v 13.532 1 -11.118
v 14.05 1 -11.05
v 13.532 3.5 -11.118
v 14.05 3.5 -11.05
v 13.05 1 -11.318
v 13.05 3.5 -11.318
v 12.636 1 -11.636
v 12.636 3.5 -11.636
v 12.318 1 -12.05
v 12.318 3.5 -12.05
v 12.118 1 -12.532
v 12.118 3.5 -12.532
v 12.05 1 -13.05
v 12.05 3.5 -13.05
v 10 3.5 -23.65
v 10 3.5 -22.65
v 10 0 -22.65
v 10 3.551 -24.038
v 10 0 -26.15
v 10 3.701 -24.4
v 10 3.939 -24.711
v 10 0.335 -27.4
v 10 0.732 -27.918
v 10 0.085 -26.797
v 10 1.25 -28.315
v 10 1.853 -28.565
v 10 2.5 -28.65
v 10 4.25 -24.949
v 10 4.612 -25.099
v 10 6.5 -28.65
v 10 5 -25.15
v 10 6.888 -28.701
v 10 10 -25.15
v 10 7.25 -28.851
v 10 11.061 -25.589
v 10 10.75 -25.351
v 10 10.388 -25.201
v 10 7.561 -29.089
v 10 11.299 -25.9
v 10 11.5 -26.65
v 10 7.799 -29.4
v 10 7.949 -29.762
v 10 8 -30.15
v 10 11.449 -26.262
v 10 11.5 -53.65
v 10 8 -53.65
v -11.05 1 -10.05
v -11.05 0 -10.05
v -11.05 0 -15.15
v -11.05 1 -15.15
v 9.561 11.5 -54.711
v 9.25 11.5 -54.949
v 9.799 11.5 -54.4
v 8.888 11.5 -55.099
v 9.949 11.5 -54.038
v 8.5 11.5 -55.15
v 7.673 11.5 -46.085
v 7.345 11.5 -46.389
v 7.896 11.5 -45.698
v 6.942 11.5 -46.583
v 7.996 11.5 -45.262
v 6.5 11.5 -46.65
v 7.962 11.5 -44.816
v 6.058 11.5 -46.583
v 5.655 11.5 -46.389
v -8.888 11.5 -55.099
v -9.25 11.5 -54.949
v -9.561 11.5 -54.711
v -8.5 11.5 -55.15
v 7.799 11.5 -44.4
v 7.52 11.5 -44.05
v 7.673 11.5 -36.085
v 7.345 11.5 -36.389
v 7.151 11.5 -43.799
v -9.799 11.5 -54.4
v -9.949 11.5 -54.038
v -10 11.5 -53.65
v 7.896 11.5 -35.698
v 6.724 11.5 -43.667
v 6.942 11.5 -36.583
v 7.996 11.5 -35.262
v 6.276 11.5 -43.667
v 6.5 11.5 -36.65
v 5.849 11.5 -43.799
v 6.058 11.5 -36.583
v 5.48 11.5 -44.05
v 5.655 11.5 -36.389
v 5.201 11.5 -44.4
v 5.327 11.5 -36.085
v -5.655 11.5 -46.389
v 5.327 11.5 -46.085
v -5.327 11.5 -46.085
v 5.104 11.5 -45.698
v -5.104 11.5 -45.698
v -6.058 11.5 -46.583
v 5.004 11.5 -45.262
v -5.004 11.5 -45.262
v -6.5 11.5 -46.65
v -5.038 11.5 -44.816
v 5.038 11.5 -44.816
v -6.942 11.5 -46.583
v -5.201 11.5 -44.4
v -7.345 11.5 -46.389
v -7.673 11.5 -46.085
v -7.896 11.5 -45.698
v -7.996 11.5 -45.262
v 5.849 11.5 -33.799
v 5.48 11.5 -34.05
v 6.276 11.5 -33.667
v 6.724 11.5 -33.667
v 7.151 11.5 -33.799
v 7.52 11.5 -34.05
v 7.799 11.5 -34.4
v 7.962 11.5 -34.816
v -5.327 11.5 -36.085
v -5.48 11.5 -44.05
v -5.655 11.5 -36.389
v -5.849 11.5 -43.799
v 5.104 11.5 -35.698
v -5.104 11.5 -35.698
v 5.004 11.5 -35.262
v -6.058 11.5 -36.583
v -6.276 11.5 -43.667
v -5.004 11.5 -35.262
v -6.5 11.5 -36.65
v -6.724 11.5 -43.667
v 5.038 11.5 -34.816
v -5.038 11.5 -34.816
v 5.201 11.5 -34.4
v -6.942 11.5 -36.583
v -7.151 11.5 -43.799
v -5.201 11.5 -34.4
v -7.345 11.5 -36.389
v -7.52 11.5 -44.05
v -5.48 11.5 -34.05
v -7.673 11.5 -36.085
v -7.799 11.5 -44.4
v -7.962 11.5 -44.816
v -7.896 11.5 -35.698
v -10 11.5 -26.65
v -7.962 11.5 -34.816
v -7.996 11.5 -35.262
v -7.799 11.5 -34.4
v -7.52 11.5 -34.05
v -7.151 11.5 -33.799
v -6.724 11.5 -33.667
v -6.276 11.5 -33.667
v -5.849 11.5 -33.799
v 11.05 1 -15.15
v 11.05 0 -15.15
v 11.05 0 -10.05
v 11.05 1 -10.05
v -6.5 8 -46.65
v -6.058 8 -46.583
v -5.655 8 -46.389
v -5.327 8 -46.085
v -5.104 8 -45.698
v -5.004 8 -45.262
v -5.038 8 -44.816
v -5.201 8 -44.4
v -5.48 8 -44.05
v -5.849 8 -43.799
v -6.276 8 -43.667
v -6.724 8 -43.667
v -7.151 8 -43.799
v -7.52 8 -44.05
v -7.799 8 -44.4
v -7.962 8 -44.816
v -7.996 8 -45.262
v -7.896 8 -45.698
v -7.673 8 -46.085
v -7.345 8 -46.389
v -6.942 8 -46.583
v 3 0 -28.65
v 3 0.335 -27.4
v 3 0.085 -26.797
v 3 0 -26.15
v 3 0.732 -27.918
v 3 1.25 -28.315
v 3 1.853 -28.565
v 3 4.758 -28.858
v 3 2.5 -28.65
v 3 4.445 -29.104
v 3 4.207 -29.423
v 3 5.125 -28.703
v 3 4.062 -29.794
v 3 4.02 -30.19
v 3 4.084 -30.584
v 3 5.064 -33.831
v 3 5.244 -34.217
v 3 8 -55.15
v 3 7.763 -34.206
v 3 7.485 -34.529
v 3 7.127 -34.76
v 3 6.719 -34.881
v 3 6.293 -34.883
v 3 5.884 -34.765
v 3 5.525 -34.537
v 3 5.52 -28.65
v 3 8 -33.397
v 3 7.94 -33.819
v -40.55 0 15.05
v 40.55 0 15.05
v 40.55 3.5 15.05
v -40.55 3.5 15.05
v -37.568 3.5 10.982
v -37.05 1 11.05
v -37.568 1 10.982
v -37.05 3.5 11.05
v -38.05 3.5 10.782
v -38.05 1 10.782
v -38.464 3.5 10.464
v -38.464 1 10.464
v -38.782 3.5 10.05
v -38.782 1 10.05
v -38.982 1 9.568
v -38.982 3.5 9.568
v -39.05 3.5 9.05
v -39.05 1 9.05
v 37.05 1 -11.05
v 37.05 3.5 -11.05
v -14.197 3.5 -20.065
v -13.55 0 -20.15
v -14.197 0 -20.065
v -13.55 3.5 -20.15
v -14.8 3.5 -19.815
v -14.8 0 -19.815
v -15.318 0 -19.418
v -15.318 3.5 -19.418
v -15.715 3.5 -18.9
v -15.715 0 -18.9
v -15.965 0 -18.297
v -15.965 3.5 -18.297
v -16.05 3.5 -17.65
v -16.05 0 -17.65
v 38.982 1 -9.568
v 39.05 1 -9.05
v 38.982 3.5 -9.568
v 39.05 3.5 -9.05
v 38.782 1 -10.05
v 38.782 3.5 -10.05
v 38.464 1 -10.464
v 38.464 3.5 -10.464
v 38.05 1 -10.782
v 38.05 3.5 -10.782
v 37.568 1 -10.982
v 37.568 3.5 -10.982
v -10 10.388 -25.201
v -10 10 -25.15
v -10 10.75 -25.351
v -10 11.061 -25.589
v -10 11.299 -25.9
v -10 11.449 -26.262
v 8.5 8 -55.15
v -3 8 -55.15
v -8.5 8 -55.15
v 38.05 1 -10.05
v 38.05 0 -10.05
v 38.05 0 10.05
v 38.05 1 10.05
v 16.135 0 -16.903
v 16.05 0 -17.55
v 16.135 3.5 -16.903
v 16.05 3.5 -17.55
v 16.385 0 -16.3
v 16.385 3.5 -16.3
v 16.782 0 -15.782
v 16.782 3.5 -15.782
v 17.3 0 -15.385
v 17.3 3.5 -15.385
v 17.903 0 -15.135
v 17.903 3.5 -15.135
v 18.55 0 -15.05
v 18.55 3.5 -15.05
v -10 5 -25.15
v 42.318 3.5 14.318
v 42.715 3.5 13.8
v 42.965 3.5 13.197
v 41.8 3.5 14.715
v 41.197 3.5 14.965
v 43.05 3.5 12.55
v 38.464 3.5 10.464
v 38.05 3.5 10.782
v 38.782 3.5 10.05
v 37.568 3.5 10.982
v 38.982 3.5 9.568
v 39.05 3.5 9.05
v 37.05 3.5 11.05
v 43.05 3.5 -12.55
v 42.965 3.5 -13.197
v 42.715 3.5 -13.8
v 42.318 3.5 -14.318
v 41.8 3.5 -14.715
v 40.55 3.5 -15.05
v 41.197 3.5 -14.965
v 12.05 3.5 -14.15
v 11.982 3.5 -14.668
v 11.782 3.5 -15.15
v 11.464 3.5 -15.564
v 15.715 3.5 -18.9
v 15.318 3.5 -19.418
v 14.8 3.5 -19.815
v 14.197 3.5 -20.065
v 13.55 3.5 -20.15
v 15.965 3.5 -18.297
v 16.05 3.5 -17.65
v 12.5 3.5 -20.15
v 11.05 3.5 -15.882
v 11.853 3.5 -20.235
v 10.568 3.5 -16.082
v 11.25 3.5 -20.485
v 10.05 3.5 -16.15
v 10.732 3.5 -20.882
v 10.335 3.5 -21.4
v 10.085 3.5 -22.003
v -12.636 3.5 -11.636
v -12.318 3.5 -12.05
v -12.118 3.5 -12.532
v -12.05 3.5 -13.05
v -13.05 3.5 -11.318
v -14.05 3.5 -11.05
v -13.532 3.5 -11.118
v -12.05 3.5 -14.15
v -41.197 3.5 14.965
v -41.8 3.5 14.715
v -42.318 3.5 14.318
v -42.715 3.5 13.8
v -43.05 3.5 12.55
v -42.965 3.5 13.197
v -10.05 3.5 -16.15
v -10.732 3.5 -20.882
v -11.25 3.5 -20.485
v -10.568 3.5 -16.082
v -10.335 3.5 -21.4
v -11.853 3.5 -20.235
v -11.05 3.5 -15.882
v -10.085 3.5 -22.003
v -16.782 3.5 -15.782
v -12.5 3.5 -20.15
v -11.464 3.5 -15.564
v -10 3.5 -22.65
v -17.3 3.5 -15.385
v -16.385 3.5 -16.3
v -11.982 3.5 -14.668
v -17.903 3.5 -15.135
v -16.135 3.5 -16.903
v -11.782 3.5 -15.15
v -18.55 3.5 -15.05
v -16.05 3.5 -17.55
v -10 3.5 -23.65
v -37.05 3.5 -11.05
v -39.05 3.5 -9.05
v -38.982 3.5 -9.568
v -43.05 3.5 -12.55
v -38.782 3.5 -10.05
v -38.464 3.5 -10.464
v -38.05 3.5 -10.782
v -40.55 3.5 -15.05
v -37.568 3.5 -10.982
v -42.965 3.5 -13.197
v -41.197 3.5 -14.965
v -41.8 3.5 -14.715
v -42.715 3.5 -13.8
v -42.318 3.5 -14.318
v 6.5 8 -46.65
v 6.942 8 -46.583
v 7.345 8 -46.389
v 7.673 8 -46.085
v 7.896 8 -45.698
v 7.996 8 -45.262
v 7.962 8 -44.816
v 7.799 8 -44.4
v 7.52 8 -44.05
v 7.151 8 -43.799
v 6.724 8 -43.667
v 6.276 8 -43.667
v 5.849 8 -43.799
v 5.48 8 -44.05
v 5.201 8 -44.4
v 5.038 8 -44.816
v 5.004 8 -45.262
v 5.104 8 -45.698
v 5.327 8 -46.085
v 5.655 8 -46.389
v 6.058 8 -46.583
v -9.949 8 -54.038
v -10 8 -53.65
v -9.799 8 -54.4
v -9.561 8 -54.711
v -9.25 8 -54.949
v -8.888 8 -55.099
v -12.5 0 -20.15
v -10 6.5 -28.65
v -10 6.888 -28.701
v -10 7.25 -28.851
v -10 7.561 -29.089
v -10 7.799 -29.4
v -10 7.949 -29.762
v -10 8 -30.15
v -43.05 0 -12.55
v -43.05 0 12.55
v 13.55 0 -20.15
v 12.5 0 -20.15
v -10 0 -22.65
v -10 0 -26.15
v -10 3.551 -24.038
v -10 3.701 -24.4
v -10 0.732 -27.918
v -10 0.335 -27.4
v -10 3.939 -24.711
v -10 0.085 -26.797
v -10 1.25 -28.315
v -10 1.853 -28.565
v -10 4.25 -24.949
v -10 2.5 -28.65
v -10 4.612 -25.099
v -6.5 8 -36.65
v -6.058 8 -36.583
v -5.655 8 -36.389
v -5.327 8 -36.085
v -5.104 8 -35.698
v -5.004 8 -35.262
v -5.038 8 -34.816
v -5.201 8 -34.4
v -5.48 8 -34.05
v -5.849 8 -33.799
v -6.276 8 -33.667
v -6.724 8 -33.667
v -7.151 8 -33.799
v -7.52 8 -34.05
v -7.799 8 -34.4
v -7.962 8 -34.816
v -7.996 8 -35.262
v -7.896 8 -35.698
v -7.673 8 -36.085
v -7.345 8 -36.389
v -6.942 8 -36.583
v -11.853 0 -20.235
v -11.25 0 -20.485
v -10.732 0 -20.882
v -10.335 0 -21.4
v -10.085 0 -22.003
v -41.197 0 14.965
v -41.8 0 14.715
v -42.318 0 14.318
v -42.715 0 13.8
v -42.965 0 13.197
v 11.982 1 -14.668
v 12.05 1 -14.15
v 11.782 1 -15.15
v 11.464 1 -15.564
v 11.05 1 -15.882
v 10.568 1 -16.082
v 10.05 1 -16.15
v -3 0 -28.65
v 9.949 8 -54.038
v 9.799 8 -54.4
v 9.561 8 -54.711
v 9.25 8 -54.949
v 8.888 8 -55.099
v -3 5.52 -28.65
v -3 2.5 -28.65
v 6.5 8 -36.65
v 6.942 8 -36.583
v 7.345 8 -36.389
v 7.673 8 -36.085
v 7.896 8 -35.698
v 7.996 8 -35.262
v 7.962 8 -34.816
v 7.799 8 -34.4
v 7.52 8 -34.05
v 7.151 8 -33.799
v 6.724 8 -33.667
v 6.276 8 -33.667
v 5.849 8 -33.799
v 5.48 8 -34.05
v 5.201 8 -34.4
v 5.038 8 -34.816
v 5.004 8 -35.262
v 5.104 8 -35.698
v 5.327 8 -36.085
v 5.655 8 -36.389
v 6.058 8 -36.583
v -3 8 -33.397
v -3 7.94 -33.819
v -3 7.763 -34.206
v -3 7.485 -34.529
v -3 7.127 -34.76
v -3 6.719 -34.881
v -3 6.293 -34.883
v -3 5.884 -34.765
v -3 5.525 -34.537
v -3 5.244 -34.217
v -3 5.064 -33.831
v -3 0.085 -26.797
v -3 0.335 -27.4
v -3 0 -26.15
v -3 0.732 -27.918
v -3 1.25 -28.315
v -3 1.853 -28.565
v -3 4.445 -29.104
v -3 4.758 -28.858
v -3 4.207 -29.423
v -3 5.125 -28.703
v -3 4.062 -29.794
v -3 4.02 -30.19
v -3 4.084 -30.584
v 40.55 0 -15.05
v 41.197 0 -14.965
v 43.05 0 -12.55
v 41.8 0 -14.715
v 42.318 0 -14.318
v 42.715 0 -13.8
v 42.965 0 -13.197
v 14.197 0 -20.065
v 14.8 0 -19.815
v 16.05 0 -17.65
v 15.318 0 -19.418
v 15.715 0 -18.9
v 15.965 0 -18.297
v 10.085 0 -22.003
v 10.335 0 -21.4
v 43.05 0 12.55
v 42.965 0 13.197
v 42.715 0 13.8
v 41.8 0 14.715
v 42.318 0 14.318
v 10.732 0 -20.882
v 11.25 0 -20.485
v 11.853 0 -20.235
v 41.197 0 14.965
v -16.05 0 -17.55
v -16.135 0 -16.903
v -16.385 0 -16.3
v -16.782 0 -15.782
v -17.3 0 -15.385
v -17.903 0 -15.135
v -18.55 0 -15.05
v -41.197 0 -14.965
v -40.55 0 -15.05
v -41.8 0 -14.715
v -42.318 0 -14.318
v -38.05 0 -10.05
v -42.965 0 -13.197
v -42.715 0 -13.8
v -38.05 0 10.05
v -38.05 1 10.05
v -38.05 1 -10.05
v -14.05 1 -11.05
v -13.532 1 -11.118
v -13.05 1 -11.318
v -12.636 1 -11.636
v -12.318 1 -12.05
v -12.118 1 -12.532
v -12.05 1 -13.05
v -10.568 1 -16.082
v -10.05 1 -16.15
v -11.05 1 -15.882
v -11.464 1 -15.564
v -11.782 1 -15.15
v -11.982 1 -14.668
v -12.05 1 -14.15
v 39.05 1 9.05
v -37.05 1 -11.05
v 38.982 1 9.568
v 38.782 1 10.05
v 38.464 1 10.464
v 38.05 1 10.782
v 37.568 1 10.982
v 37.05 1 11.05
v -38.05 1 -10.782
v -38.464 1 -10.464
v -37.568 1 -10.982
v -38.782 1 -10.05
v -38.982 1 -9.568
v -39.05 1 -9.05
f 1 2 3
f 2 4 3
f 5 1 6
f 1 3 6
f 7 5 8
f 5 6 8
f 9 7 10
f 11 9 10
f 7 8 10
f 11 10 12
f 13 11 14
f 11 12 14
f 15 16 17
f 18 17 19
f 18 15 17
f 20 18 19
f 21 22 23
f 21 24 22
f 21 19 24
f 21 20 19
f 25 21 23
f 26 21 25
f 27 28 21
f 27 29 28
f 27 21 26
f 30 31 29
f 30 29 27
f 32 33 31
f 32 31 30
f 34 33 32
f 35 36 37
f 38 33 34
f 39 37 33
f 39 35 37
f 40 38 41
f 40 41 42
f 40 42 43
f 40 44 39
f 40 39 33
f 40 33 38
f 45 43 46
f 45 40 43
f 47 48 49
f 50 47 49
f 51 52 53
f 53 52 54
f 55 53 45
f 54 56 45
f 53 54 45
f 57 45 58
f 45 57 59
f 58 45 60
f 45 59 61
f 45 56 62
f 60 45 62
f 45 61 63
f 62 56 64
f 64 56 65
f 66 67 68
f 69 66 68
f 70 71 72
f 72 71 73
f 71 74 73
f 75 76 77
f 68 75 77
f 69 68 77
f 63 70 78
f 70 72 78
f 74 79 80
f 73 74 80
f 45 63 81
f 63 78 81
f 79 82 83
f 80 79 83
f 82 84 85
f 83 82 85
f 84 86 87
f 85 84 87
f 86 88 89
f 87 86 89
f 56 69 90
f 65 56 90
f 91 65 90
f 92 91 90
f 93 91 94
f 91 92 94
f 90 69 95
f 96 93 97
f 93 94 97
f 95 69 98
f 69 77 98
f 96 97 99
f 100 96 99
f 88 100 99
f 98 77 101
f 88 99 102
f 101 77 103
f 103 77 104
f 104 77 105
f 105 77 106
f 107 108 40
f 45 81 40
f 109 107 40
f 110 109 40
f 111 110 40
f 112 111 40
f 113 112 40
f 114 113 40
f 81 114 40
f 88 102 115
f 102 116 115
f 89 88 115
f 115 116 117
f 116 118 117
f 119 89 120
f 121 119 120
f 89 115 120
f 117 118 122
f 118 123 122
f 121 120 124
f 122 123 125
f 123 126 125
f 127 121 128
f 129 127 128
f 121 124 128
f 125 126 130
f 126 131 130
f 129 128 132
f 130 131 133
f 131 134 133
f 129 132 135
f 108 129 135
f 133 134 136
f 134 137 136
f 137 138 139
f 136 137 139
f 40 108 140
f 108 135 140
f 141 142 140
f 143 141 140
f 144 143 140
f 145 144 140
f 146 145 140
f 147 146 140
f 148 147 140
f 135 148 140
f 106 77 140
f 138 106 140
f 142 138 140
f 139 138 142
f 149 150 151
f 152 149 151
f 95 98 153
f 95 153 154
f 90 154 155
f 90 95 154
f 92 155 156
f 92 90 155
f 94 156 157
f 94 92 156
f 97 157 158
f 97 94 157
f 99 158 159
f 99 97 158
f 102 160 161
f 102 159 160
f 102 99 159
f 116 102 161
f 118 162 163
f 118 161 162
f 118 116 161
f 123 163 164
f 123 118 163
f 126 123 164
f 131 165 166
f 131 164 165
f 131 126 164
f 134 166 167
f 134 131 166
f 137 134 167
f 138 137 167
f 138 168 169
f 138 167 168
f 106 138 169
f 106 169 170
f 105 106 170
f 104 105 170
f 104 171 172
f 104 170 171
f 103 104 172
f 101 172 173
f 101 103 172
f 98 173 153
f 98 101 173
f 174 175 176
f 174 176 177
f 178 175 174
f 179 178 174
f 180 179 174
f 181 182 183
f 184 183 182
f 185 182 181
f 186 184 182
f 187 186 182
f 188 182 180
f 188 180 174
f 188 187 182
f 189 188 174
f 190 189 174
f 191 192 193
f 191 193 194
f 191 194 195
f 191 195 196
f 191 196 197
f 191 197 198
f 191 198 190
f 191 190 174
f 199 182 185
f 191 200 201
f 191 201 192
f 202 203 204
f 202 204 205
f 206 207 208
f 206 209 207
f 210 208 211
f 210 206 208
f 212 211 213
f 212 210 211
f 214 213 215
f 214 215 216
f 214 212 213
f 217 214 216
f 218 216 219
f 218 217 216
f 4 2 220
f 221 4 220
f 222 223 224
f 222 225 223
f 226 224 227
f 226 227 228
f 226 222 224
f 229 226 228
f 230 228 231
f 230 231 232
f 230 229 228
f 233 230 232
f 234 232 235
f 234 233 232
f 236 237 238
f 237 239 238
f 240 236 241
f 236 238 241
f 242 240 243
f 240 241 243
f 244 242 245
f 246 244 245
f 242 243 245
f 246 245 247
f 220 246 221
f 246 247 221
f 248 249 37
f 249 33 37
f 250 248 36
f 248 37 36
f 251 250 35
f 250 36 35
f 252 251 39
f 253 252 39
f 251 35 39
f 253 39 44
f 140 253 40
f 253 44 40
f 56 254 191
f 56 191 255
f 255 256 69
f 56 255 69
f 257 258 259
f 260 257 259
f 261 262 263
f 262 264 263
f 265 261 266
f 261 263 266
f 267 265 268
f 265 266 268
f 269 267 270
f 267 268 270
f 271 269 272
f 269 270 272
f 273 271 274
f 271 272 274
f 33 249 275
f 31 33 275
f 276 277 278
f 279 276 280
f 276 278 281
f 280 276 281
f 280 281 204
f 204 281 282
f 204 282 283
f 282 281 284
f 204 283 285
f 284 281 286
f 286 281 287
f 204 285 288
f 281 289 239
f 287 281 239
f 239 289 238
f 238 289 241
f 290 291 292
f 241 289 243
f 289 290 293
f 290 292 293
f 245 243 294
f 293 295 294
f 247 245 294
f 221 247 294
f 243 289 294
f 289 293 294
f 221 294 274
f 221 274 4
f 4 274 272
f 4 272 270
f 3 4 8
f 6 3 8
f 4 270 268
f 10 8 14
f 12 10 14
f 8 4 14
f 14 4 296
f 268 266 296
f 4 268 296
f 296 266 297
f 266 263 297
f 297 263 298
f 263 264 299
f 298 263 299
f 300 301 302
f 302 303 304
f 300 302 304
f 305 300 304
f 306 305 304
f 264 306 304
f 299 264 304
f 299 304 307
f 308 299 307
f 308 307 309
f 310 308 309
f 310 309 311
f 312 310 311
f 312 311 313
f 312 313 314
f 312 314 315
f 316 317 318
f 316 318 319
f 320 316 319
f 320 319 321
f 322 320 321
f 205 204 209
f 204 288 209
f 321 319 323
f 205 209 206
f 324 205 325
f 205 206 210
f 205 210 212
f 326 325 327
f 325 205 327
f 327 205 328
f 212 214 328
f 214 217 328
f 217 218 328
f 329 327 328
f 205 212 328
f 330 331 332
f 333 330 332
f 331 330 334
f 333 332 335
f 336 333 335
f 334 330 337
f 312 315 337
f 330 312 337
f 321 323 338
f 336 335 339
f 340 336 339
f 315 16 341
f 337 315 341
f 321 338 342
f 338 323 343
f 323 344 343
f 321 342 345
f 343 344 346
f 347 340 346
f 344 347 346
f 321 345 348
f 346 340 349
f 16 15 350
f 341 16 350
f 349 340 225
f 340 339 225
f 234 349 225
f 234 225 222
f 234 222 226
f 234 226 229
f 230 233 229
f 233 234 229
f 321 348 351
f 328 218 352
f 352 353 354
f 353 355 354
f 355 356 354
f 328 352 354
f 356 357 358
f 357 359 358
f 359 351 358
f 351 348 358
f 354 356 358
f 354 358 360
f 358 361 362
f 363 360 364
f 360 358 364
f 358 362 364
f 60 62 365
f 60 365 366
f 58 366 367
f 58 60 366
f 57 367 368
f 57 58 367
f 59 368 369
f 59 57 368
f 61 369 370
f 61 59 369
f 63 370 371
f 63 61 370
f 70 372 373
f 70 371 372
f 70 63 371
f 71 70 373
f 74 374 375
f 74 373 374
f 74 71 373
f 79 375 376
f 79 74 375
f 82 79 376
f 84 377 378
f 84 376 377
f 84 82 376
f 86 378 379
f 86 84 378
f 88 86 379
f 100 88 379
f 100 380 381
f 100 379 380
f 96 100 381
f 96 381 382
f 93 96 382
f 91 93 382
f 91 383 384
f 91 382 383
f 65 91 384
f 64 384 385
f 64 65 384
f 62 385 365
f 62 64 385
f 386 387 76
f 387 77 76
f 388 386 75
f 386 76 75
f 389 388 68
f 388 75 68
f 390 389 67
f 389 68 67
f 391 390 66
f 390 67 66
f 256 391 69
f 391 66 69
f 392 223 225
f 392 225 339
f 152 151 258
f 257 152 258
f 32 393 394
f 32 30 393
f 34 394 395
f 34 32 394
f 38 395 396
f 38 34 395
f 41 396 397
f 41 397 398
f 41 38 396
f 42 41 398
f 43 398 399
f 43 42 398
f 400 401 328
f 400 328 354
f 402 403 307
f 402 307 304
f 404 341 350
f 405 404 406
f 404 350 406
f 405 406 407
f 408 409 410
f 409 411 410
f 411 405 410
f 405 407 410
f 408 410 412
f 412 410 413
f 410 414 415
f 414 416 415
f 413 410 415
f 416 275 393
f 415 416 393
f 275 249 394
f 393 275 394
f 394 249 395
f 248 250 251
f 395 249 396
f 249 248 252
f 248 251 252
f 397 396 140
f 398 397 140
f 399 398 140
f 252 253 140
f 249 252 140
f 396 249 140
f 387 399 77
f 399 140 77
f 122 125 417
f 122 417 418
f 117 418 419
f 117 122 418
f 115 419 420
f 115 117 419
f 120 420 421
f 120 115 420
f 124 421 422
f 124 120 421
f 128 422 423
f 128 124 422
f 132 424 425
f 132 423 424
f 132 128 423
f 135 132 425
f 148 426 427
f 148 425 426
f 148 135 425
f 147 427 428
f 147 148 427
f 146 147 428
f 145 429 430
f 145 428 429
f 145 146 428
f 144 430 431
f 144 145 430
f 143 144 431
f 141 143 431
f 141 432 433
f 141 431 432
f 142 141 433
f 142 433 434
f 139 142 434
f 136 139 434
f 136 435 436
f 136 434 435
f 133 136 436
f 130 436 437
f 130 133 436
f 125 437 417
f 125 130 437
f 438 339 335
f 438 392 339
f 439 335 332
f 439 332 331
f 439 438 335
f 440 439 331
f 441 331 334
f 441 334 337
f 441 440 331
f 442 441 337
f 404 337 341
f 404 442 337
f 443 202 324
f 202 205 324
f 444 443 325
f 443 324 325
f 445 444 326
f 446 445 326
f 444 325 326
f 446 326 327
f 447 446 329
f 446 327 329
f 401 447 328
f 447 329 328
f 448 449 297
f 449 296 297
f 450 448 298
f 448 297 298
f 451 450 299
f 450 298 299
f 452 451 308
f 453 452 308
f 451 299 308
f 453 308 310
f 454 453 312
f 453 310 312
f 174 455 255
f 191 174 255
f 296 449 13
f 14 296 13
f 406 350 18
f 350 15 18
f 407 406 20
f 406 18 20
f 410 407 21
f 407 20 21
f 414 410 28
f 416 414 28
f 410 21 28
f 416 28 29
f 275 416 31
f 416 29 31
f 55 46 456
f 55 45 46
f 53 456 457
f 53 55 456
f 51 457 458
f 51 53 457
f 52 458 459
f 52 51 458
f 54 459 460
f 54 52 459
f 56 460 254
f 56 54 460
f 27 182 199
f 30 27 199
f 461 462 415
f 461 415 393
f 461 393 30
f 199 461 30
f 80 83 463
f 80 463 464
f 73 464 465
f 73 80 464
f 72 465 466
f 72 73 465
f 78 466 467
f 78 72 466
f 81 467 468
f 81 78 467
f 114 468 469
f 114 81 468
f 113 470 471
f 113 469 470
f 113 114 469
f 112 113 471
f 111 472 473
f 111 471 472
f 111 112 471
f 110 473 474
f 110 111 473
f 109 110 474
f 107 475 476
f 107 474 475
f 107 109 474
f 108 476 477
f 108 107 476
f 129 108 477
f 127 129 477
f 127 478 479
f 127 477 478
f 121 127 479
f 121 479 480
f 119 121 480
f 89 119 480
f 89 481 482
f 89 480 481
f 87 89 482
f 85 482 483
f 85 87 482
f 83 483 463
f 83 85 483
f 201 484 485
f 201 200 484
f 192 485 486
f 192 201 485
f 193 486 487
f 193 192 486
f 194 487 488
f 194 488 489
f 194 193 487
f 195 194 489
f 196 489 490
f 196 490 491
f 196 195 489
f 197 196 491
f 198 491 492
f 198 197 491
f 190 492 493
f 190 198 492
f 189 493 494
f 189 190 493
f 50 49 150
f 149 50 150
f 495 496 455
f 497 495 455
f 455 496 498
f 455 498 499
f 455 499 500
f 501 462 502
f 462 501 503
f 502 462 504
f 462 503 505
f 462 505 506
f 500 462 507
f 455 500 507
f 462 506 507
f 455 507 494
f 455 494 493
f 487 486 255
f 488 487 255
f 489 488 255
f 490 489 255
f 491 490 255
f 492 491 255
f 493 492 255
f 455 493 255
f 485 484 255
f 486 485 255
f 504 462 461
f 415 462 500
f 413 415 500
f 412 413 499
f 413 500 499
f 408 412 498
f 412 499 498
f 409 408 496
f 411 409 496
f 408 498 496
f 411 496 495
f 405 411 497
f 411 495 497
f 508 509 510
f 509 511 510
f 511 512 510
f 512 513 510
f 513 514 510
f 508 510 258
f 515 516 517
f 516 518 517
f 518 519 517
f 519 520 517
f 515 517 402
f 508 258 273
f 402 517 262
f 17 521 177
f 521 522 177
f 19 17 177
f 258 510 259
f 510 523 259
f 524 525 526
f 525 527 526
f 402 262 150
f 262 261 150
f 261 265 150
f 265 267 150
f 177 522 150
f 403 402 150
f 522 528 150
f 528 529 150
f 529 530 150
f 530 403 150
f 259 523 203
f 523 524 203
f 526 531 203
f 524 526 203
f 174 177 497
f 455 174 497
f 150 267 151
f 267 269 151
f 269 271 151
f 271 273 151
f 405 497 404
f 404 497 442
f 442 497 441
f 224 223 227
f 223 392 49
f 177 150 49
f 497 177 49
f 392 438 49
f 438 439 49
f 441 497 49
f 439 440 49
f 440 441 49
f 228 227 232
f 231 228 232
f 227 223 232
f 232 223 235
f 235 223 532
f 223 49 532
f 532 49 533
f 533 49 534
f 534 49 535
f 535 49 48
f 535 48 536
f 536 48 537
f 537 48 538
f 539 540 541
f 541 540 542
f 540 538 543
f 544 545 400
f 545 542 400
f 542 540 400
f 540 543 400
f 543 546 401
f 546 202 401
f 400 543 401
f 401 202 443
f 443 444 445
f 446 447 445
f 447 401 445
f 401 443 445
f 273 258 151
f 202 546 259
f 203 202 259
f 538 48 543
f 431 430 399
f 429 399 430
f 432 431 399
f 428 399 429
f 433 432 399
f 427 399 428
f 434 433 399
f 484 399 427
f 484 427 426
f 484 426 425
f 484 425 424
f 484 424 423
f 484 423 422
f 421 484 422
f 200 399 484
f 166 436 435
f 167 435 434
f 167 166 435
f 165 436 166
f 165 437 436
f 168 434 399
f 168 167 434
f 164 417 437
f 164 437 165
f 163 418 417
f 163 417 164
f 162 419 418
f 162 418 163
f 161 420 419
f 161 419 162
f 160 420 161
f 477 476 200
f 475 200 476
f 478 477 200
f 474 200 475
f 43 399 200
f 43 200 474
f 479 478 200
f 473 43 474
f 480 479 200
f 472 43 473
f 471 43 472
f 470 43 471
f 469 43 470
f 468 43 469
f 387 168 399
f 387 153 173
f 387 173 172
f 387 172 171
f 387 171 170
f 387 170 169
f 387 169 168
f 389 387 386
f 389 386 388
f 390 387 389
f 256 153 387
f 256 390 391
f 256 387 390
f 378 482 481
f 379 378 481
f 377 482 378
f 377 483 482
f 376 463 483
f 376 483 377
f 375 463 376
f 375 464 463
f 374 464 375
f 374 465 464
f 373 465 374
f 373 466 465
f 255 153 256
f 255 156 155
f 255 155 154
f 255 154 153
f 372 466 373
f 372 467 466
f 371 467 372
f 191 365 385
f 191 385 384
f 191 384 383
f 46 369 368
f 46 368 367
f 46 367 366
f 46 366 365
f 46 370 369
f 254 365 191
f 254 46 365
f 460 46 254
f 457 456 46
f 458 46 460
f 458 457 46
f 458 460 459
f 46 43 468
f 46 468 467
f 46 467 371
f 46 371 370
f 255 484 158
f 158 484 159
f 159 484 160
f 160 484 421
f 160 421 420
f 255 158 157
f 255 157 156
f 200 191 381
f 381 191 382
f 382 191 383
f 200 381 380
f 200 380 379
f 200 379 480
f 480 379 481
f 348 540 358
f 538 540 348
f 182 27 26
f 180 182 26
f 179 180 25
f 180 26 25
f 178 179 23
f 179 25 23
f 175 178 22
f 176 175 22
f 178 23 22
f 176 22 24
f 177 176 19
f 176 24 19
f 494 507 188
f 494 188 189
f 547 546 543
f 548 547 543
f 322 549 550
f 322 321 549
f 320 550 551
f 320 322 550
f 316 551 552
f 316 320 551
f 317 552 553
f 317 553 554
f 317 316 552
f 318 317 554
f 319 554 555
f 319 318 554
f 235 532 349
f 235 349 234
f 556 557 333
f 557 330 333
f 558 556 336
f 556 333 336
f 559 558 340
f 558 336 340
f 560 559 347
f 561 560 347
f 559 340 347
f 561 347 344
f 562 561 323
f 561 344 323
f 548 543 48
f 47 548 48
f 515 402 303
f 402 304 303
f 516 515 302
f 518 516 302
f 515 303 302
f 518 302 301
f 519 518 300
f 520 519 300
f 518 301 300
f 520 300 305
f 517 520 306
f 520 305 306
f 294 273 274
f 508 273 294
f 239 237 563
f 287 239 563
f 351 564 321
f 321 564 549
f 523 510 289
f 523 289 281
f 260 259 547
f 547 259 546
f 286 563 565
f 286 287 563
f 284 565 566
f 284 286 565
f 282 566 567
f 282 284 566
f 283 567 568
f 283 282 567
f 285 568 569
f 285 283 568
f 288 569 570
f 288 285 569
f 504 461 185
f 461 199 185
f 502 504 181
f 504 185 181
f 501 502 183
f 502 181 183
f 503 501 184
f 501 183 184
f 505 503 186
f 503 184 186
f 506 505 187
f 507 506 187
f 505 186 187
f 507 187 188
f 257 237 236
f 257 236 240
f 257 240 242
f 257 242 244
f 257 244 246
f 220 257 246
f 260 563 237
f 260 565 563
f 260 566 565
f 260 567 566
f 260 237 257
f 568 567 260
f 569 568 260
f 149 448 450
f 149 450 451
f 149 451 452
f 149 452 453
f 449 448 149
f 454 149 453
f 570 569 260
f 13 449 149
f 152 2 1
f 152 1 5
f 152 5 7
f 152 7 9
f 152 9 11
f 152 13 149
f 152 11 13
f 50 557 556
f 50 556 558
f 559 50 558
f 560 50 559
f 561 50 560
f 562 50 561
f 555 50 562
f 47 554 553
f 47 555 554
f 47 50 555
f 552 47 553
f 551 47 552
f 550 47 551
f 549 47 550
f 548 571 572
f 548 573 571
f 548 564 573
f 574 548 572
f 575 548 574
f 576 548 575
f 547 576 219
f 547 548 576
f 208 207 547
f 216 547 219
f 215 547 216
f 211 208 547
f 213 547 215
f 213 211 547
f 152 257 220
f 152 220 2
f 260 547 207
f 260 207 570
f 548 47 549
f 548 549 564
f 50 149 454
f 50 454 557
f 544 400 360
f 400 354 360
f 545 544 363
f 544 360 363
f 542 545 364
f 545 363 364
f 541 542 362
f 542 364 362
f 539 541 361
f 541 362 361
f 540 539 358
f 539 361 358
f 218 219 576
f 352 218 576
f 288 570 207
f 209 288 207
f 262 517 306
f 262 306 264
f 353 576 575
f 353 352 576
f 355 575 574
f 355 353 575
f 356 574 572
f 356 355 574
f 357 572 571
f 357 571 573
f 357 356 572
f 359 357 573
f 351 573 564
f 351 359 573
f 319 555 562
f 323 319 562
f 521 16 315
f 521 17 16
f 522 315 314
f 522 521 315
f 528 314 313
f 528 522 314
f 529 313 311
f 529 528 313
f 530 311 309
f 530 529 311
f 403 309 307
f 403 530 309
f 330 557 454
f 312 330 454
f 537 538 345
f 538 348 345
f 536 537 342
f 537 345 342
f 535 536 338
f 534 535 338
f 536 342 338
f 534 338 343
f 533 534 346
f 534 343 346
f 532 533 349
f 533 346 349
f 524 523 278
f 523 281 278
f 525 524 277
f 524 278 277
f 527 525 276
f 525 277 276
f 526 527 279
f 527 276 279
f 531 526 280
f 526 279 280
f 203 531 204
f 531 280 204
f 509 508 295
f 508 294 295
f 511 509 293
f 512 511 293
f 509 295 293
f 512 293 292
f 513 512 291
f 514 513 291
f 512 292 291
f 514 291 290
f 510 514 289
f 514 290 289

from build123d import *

# Parameters (mm, degrees)
RESSALTO_EXTRUS_O1_DEPTH      = 3.5
RESSALTO_EXTRUS_O2_DEPTH      = 1
RESSALTO_EXTRUS_O3_DEPTH      = 10
RESSALTO_EXTRUS_O3_DEPTH_BACK = 10
ESBO_O4_W                     = 26.5
ESBO_O4_H                     = 8
CORTE_EXTRUS_O1_DEPTH         = 7
CORTE_EXTRUS_O2_START         = -20
ESBO_O4_2_W                   = 26.5
ESBO_O4_2_H                   = 8
CORTE_EXTRUS_O2_DEPTH         = 7
CORTE_EXTRUS_O3_DEPTH         = 71.418925013
CORTE_EXTRUS_O3_DEPTH_BACK    = 71.418925013
ESBO_O5_R                     = 1.5
FILETE1_R                     = 2
FILETE2_R                     = 2.5
FILETE3_R                     = 1.5
CORTE_EXTRUS_O4_DEPTH         = 7
CORTE_EXTRUS_O5_START         = -13
CORTE_EXTRUS_O5_DEPTH         = 7


with BuildPart() as part:
    # Esboço1 → Ressalto-extrusão1 (new body)
    with BuildSketch(Plane(origin=(0, 0, 0), x_dir=(1, 0, 0), z_dir=(0, 1, 0))):
        Polygon((-16.05, 20.15), (16.05, 20.15), (16.05, 15.05), (43.05, 15.05), (43.05, -15.05), (-43.05, -15.05), (-43.05, 15.05), (-16.05, 15.05), align=None)
        Polygon((12.05, 11.05), (39.05, 11.05), (39.05, -11.05), (-39.05, -11.05), (-39.05, 11.05), (-12.05, 11.05), (-12.05, 16.15), (12.05, 16.15), align=None, mode=Mode.SUBTRACT)
    extrude(amount=RESSALTO_EXTRUS_O1_DEPTH)

    # Esboço2 → Ressalto-extrusão2 (add)
    with BuildSketch(Plane.XZ):
        Polygon((39.05, 11.05), (39.05, -11.05), (12.05, -11.05), (12.05, -16.15), (-12.05, -16.15), (-12.05, -11.05), (-39.05, -11.05), (-39.05, 11.05), align=None)
        Polygon((38.05, -10.05), (38.05, 10.05), (-38.05, 10.05), (-38.05, -10.05), (-11.05, -10.05), (-11.05, -15.15), (11.05, -15.15), (11.05, -10.05), align=None, mode=Mode.SUBTRACT)
    extrude(amount=-RESSALTO_EXTRUS_O2_DEPTH)

    # Esboço3 → Ressalto-extrusão3 (add, two sides: drawn at the far end of the back side and taken through both)
    with BuildSketch(Plane(origin=(0, 0, 0), x_dir=(0, 0, -1), z_dir=(1, 0, 0)).offset(-RESSALTO_EXTRUS_O3_DEPTH_BACK)):
        Polygon((20.15, 0), (28.65, 0), (55.15, 8), (55.15, 11.5), (25.15, 11.5), (25.15, 3.5), (20.15, 3.5), align=None)
        Polygon((28.65, 3.5), (43.55625, 8), (28.65, 8), align=None, mode=Mode.SUBTRACT)
    extrude(amount=RESSALTO_EXTRUS_O3_DEPTH + RESSALTO_EXTRUS_O3_DEPTH_BACK)

    # Esboço4 → Corte-extrusão1 (cut)
    with BuildSketch(Plane(origin=(10, 0, 0), x_dir=(0, 0, -1), z_dir=(1, 0, 0))):
        with Locations((41.9, 4)):
            Rectangle(ESBO_O4_W, ESBO_O4_H)
    extrude(amount=-CORTE_EXTRUS_O1_DEPTH, mode=Mode.SUBTRACT)

    # Esboço4<2> → Corte-extrusão2 (cut)
    with BuildSketch(Plane(origin=(10, 0, 0), x_dir=(0, 0, -1), z_dir=(1, 0, 0)).offset(CORTE_EXTRUS_O2_START)):
        with Locations((41.9, 4)):
            Rectangle(ESBO_O4_2_W, ESBO_O4_2_H)
    extrude(amount=CORTE_EXTRUS_O2_DEPTH, mode=Mode.SUBTRACT)

    # Esboço5 → Corte-extrusão3 (cut, two sides: drawn at the far end of the back side and taken through both)
    with BuildSketch(Plane.XZ.offset(-8).offset(-CORTE_EXTRUS_O3_DEPTH_BACK)):
        with Locations(Location((-6.5, -45.15, 0), (0, 0, 270))):
            Circle(ESBO_O5_R)
        with Locations(Location((6.5, -45.15, 0), (0, 0, 270))):
            Circle(ESBO_O5_R)
        with Locations(Location((-6.5, -35.15, 0), (0, 0, 270))):
            Circle(ESBO_O5_R)
        with Locations(Location((6.5, -35.15, 0), (0, 0, 270))):
            Circle(ESBO_O5_R)
    extrude(amount=CORTE_EXTRUS_O3_DEPTH + CORTE_EXTRUS_O3_DEPTH_BACK, mode=Mode.SUBTRACT)

    # Filete1
    filete1_edges = [part.edges().sort_by_distance(p)[0] for p in [
        (39.05, 2.25, 11.05),
        (39.05, 2.25, -11.05),
        (12.05, 2.25, -11.05),
        (12.05, 2.25, -16.15),
        (-12.05, 2.25, -16.15),
        (-12.05, 2.25, -11.05),
        (-39.05, 2.25, -11.05),
        (-39.05, 2.25, 11.05),
    ]]
    fillet(filete1_edges, radius=FILETE1_R)

    # Filete2
    filete2_edges = [part.edges().sort_by_distance(p)[0] for p in [
        (10, 1.75, -20.15),
        (-10, 1.75, -20.15),
        (-16.05, 1.75, -20.15),
        (16.05, 1.75, -20.15),
        (16.05, 1.75, -15.05),
        (43.05, 1.75, -15.05),
        (43.05, 1.75, 15.05),
        (-43.05, 1.75, 15.05),
        (-43.05, 1.75, -15.05),
        (-16.05, 1.75, -15.05),
    ]]
    fillet(filete2_edges, radius=FILETE2_R)

    # Filete3
    filete3_edges = [part.edges().sort_by_distance(p)[0] for p in [
        (10, 9.75, -55.15),
        (-10, 9.75, -55.15),
        (0, 11.5, -25.15),
        (0, 3.5, -25.15),
        (0, 8, -28.65),
        (0, 8, -43.55625),
        (0, 3.5, -28.65),
    ]]
    fillet(filete3_edges, radius=FILETE3_R)

    # Esboço6 → Corte-extrusão4 (cut)
    with BuildSketch(Plane(origin=(10, 0, 0), x_dir=(0, 0, -1), z_dir=(1, 0, 0))):
        with BuildLine():
            Line((26.15, 0), (28.65, 0))
            Line((28.65, 0), (28.65, 2.5))
            ThreePointArc((28.65, 2.5), (27.917766953, 0.732233047), (26.15, 0))
        make_face()
    extrude(amount=-CORTE_EXTRUS_O4_DEPTH, mode=Mode.SUBTRACT)

    # Esboço6<2> → Corte-extrusão5 (cut)
    with BuildSketch(Plane(origin=(10, 0, 0), x_dir=(0, 0, -1), z_dir=(1, 0, 0)).offset(CORTE_EXTRUS_O5_START)):
        with BuildLine():
            Line((26.15, 0), (28.65, 0))
            Line((28.65, 0), (28.65, 2.5))
            ThreePointArc((28.65, 2.5), (27.917766953, 0.732233047), (26.15, 0))
        make_face()
    extrude(amount=-CORTE_EXTRUS_O5_DEPTH, mode=Mode.SUBTRACT)


solid = part.part
